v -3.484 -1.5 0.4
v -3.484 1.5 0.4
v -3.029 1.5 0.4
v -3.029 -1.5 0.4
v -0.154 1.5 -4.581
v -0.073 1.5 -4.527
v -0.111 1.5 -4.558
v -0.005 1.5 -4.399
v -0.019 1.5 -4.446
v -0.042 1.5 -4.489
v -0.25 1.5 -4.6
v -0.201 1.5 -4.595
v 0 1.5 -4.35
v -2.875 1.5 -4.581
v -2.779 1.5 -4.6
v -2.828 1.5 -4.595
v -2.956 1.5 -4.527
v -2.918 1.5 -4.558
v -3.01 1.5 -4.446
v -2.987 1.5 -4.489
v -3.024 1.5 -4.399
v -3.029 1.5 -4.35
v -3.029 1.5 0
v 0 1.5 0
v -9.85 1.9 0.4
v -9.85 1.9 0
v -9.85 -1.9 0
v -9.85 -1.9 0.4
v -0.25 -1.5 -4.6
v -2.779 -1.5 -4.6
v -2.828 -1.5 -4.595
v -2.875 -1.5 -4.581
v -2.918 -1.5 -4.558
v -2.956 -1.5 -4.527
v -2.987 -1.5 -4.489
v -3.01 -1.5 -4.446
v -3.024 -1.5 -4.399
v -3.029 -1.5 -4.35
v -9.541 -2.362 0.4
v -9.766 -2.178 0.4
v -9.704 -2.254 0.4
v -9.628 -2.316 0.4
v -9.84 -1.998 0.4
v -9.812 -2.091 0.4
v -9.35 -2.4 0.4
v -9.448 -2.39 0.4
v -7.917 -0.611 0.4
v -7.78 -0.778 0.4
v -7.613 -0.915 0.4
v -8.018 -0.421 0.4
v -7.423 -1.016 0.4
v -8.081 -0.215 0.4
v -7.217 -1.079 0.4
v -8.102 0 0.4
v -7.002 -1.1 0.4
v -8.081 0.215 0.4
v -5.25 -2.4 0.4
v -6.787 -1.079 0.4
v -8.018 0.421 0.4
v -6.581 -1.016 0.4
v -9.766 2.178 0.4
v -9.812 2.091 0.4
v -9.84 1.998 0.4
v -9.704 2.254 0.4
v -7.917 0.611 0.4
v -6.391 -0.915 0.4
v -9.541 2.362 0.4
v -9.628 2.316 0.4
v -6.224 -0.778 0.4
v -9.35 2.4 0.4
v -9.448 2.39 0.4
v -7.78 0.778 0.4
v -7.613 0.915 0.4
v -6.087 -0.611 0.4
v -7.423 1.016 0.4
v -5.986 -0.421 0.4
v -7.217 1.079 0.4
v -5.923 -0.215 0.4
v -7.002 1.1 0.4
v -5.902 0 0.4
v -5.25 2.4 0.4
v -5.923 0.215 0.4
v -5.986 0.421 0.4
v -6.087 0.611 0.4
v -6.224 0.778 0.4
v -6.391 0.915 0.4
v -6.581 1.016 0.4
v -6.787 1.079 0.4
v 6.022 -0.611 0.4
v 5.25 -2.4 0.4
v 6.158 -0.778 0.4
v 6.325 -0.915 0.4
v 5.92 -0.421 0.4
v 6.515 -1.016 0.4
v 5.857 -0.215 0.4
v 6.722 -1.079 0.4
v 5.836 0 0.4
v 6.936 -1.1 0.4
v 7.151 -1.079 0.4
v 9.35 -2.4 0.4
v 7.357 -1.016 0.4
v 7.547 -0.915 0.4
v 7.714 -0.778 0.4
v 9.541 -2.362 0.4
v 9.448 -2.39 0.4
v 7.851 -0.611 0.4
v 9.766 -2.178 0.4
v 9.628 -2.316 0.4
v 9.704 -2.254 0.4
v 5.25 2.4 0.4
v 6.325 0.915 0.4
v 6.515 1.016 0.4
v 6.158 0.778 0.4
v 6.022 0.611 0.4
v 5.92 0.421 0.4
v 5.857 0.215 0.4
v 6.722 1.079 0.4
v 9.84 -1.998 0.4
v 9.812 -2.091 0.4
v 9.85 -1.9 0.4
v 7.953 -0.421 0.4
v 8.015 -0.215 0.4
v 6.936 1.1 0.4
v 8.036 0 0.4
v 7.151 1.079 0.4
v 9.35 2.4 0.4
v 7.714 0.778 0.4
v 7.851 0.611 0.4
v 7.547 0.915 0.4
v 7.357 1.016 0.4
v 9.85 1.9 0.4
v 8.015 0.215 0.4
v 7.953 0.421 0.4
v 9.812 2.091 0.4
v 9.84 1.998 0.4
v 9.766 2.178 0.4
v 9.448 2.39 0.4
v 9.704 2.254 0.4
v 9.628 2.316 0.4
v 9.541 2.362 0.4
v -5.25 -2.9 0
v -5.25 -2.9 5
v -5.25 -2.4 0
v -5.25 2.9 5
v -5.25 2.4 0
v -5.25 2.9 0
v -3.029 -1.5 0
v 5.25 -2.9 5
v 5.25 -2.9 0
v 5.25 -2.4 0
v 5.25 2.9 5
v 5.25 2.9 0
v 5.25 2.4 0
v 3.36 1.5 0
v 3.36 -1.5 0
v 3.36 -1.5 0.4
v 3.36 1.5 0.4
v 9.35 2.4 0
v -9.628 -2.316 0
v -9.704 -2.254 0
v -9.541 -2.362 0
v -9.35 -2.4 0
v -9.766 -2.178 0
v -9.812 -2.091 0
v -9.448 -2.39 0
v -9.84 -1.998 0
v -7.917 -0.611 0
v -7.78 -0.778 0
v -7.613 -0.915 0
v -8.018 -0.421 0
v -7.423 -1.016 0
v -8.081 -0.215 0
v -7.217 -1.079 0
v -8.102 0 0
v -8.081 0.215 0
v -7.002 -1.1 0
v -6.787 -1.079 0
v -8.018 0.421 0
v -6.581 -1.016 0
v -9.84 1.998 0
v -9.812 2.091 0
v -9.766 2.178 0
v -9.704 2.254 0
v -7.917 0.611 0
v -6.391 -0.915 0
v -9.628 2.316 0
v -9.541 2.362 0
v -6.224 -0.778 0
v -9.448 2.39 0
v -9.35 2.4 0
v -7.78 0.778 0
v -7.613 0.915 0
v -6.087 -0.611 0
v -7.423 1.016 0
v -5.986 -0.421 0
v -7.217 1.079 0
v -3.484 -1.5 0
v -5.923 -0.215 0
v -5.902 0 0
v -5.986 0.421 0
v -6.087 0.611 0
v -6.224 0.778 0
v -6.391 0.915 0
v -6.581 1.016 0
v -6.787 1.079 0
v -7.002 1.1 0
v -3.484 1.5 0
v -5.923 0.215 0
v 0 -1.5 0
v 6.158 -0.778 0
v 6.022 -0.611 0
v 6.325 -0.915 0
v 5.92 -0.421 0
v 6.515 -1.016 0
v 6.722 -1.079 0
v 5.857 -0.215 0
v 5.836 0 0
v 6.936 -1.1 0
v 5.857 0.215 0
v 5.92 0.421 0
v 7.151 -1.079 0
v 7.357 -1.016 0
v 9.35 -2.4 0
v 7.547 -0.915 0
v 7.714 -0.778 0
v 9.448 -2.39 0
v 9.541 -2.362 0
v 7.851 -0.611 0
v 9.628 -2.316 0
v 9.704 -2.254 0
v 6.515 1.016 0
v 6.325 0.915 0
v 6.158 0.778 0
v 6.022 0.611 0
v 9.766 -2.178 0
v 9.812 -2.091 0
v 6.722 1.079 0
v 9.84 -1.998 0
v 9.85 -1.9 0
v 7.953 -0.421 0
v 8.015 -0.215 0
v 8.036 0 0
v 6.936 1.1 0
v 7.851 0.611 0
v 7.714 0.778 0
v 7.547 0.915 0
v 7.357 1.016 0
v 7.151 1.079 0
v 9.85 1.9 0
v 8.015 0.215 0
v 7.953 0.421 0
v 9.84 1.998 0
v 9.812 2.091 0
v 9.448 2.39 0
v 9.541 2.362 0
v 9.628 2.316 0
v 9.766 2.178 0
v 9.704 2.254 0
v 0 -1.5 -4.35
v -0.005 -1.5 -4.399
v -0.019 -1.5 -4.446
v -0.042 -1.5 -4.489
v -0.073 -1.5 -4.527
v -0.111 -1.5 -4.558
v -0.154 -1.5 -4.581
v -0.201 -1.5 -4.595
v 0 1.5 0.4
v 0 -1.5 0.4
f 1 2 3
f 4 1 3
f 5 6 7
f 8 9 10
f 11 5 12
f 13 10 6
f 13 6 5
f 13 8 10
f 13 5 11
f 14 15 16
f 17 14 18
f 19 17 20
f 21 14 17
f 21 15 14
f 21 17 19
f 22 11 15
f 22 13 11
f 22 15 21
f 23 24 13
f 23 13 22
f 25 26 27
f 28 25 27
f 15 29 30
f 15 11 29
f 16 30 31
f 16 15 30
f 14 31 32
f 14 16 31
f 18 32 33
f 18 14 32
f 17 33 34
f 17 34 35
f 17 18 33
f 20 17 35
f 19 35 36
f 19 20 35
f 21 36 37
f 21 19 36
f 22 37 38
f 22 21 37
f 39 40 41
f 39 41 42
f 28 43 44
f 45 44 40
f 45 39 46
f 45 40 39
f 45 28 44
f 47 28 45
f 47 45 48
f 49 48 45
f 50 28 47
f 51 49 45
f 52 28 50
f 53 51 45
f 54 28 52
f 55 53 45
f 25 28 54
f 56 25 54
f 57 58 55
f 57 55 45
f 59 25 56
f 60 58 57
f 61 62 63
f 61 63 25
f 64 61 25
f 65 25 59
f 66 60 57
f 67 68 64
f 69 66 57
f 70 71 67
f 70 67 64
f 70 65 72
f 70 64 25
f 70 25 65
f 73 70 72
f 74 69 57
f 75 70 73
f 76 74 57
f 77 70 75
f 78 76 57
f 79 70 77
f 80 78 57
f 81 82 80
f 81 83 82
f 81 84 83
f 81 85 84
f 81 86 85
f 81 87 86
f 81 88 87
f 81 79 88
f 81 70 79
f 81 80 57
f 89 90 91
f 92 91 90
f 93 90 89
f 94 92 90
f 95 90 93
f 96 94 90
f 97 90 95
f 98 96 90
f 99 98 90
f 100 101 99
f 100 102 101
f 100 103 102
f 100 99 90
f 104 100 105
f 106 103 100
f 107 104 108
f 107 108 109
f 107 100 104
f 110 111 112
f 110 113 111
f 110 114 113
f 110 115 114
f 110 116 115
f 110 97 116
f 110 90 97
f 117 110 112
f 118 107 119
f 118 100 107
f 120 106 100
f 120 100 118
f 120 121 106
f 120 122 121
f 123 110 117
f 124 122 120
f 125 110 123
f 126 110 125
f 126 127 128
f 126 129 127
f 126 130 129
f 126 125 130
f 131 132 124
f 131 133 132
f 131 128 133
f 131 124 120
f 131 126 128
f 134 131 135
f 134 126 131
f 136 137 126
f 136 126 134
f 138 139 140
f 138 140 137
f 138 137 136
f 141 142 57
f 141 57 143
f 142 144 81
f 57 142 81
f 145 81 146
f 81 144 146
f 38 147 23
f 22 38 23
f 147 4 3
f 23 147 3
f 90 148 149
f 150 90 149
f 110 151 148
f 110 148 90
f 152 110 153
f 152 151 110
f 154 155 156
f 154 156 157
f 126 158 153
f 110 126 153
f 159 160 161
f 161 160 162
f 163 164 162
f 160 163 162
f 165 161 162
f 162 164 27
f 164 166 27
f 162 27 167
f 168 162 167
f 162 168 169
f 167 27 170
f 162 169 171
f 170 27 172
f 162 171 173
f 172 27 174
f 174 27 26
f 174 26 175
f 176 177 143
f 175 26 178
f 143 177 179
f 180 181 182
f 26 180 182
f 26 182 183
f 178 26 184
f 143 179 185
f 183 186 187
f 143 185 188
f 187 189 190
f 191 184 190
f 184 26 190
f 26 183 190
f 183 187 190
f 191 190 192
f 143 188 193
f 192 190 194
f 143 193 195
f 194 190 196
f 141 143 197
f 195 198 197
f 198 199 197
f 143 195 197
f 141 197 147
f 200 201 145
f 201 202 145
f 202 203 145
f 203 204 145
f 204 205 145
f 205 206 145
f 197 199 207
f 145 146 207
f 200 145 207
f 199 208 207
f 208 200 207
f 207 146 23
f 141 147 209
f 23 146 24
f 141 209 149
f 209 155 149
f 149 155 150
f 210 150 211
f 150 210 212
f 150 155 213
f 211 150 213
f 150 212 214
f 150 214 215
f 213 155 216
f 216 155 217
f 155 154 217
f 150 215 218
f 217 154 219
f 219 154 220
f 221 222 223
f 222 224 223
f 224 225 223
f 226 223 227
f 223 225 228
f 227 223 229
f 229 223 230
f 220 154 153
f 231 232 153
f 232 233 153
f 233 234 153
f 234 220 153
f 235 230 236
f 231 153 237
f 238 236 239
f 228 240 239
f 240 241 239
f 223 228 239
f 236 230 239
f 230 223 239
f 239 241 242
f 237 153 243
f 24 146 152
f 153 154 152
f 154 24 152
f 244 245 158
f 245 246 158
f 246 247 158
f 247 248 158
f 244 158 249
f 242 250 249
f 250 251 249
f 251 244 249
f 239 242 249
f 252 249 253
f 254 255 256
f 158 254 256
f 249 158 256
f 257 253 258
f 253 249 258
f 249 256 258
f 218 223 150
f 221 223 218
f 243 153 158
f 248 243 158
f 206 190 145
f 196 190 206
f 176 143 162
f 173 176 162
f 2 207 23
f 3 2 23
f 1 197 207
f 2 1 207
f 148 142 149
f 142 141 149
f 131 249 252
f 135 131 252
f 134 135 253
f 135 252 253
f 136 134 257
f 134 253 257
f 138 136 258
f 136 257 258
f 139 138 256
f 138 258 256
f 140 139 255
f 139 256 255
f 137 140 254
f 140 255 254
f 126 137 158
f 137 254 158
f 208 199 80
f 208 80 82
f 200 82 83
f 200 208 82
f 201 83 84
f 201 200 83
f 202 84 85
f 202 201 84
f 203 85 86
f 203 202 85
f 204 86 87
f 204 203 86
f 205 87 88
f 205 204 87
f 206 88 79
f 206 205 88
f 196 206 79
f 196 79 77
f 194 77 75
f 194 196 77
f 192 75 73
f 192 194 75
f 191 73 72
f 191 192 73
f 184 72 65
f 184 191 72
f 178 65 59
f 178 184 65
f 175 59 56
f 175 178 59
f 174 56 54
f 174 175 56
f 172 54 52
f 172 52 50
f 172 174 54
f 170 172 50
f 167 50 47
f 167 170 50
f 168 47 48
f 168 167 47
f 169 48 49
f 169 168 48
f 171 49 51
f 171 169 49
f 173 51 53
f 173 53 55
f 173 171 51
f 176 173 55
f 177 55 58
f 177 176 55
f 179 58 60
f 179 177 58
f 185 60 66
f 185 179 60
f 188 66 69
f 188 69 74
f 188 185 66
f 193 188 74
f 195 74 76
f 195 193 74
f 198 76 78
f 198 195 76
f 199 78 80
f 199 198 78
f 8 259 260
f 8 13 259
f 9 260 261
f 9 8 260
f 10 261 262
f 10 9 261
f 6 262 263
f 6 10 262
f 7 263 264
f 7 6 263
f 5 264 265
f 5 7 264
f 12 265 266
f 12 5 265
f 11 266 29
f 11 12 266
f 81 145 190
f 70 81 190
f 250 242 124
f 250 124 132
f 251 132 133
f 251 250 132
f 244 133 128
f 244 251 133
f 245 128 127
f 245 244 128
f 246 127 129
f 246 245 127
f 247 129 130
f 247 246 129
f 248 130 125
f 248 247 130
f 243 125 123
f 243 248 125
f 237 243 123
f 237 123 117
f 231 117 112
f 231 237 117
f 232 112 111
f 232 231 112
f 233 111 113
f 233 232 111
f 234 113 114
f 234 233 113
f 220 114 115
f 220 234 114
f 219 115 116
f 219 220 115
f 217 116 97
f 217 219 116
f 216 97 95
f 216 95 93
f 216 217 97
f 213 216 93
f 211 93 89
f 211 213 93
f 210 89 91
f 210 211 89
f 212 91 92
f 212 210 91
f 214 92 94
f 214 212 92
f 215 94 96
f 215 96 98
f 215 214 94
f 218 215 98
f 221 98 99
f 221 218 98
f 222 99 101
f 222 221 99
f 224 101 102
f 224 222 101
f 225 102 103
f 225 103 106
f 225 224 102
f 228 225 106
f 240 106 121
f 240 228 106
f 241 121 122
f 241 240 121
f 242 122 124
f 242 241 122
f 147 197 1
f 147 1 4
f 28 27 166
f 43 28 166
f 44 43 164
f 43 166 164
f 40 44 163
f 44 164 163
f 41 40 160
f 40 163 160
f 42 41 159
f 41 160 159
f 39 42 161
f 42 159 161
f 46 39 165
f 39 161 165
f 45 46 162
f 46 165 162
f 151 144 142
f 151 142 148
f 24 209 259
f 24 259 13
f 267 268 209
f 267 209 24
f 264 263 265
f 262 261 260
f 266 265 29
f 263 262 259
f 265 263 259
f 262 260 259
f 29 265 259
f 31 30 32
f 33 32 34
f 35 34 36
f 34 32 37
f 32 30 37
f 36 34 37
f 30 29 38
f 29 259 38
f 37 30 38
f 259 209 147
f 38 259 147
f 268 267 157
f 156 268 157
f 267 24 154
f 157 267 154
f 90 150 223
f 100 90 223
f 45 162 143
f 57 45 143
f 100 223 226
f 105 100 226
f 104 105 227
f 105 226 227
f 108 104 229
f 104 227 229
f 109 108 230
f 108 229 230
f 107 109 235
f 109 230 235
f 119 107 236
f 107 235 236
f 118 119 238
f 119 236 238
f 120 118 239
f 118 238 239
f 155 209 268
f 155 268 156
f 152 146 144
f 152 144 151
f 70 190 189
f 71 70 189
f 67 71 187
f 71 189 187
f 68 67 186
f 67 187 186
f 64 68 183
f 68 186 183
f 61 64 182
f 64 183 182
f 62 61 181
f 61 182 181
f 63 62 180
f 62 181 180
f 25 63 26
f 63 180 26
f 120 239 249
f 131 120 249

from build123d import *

# Parameters (mm, degrees)
ESQUISSE1_R        = 1.1
ESQUISSE1_W        = 6.844485425
ESQUISSE1_H        = 3
BOSS_EXTRU_1_DEPTH = 0.4
ESQUISSE3_W        = 10.5
ESQUISSE3_H        = 4.6
BOSS_EXTRU_3_DEPTH = 5.8
ESQUISSE4_W        = 3.029083023
ESQUISSE4_H        = 3
BOSS_EXTRU_4_DEPTH = 5
CONG_1_R           = 0.25


with BuildPart() as part:
    # Esquisse1 → Boss.-Extru.1 (new body)
    with BuildSketch(Plane.XY):
        with BuildLine():
            Line((-5.25, -2.9), (5.25, -2.9))
            Line((5.25, -2.9), (5.25, -2.4))
            Line((5.25, -2.4), (9.35, -2.4))
            ThreePointArc((9.35, -2.4), (9.703553391, -2.253553391), (9.85, -1.9))
            Line((9.85, -1.9), (9.85, 1.9))
            ThreePointArc((9.85, 1.9), (9.703553391, 2.253553391), (9.35, 2.4))
            Line((9.35, 2.4), (5.25, 2.4))
            Line((5.25, 2.4), (5.25, 2.9))
            Line((5.25, 2.9), (-5.25, 2.9))
            Line((-5.25, 2.9), (-5.25, 2.4))
            Line((-5.25, 2.4), (-9.35, 2.4))
            ThreePointArc((-9.35, 2.4), (-9.703553391, 2.253553391), (-9.85, 1.9))
            Line((-9.85, 1.9), (-9.85, -1.9))
            ThreePointArc((-9.85, -1.9), (-9.703553391, -2.253553391), (-9.35, -2.4))
            Line((-9.35, -2.4), (-5.25, -2.4))
            Line((-5.25, -2.4), (-5.25, -2.9))
        make_face()
        with Locations((-7.001967481, 0)):
            Circle(ESQUISSE1_R, mode=Mode.SUBTRACT)
        with Locations((6.936303644, 0)):
            Circle(ESQUISSE1_R, mode=Mode.SUBTRACT)
        with Locations((-0.061879176, 0)):
            Rectangle(ESQUISSE1_W, ESQUISSE1_H, mode=Mode.SUBTRACT)
    extrude(amount=BOSS_EXTRU_1_DEPTH)

    # Esquisse3 → Boss.-Extru.3 (add)
    with BuildSketch(Plane(origin=(0, 2.9, 0), x_dir=(1, 0, 0), z_dir=(0, 1, 0))):
        with Locations((0, -2.7)):
            Rectangle(ESQUISSE3_W, ESQUISSE3_H)
    extrude(amount=-BOSS_EXTRU_3_DEPTH)

    # Esquisse4 → Boss.-Extru.4 (add)
    with BuildSketch(Plane(origin=(0, 0, 0.4), x_dir=(-1, 0, 0), z_dir=(0, 0, -1))):
        with Locations((1.514541512, 0)):
            Rectangle(ESQUISSE4_W, ESQUISSE4_H)
    extrude(amount=BOSS_EXTRU_4_DEPTH)

    # Congé1
    cong_1_edges = [part.edges().sort_by_distance(p)[0] for p in [
        (-3.029083023, 0, -4.6),
        (0, 0, -4.6),
    ]]
    fillet(cong_1_edges, radius=CONG_1_R)


solid = part.part
